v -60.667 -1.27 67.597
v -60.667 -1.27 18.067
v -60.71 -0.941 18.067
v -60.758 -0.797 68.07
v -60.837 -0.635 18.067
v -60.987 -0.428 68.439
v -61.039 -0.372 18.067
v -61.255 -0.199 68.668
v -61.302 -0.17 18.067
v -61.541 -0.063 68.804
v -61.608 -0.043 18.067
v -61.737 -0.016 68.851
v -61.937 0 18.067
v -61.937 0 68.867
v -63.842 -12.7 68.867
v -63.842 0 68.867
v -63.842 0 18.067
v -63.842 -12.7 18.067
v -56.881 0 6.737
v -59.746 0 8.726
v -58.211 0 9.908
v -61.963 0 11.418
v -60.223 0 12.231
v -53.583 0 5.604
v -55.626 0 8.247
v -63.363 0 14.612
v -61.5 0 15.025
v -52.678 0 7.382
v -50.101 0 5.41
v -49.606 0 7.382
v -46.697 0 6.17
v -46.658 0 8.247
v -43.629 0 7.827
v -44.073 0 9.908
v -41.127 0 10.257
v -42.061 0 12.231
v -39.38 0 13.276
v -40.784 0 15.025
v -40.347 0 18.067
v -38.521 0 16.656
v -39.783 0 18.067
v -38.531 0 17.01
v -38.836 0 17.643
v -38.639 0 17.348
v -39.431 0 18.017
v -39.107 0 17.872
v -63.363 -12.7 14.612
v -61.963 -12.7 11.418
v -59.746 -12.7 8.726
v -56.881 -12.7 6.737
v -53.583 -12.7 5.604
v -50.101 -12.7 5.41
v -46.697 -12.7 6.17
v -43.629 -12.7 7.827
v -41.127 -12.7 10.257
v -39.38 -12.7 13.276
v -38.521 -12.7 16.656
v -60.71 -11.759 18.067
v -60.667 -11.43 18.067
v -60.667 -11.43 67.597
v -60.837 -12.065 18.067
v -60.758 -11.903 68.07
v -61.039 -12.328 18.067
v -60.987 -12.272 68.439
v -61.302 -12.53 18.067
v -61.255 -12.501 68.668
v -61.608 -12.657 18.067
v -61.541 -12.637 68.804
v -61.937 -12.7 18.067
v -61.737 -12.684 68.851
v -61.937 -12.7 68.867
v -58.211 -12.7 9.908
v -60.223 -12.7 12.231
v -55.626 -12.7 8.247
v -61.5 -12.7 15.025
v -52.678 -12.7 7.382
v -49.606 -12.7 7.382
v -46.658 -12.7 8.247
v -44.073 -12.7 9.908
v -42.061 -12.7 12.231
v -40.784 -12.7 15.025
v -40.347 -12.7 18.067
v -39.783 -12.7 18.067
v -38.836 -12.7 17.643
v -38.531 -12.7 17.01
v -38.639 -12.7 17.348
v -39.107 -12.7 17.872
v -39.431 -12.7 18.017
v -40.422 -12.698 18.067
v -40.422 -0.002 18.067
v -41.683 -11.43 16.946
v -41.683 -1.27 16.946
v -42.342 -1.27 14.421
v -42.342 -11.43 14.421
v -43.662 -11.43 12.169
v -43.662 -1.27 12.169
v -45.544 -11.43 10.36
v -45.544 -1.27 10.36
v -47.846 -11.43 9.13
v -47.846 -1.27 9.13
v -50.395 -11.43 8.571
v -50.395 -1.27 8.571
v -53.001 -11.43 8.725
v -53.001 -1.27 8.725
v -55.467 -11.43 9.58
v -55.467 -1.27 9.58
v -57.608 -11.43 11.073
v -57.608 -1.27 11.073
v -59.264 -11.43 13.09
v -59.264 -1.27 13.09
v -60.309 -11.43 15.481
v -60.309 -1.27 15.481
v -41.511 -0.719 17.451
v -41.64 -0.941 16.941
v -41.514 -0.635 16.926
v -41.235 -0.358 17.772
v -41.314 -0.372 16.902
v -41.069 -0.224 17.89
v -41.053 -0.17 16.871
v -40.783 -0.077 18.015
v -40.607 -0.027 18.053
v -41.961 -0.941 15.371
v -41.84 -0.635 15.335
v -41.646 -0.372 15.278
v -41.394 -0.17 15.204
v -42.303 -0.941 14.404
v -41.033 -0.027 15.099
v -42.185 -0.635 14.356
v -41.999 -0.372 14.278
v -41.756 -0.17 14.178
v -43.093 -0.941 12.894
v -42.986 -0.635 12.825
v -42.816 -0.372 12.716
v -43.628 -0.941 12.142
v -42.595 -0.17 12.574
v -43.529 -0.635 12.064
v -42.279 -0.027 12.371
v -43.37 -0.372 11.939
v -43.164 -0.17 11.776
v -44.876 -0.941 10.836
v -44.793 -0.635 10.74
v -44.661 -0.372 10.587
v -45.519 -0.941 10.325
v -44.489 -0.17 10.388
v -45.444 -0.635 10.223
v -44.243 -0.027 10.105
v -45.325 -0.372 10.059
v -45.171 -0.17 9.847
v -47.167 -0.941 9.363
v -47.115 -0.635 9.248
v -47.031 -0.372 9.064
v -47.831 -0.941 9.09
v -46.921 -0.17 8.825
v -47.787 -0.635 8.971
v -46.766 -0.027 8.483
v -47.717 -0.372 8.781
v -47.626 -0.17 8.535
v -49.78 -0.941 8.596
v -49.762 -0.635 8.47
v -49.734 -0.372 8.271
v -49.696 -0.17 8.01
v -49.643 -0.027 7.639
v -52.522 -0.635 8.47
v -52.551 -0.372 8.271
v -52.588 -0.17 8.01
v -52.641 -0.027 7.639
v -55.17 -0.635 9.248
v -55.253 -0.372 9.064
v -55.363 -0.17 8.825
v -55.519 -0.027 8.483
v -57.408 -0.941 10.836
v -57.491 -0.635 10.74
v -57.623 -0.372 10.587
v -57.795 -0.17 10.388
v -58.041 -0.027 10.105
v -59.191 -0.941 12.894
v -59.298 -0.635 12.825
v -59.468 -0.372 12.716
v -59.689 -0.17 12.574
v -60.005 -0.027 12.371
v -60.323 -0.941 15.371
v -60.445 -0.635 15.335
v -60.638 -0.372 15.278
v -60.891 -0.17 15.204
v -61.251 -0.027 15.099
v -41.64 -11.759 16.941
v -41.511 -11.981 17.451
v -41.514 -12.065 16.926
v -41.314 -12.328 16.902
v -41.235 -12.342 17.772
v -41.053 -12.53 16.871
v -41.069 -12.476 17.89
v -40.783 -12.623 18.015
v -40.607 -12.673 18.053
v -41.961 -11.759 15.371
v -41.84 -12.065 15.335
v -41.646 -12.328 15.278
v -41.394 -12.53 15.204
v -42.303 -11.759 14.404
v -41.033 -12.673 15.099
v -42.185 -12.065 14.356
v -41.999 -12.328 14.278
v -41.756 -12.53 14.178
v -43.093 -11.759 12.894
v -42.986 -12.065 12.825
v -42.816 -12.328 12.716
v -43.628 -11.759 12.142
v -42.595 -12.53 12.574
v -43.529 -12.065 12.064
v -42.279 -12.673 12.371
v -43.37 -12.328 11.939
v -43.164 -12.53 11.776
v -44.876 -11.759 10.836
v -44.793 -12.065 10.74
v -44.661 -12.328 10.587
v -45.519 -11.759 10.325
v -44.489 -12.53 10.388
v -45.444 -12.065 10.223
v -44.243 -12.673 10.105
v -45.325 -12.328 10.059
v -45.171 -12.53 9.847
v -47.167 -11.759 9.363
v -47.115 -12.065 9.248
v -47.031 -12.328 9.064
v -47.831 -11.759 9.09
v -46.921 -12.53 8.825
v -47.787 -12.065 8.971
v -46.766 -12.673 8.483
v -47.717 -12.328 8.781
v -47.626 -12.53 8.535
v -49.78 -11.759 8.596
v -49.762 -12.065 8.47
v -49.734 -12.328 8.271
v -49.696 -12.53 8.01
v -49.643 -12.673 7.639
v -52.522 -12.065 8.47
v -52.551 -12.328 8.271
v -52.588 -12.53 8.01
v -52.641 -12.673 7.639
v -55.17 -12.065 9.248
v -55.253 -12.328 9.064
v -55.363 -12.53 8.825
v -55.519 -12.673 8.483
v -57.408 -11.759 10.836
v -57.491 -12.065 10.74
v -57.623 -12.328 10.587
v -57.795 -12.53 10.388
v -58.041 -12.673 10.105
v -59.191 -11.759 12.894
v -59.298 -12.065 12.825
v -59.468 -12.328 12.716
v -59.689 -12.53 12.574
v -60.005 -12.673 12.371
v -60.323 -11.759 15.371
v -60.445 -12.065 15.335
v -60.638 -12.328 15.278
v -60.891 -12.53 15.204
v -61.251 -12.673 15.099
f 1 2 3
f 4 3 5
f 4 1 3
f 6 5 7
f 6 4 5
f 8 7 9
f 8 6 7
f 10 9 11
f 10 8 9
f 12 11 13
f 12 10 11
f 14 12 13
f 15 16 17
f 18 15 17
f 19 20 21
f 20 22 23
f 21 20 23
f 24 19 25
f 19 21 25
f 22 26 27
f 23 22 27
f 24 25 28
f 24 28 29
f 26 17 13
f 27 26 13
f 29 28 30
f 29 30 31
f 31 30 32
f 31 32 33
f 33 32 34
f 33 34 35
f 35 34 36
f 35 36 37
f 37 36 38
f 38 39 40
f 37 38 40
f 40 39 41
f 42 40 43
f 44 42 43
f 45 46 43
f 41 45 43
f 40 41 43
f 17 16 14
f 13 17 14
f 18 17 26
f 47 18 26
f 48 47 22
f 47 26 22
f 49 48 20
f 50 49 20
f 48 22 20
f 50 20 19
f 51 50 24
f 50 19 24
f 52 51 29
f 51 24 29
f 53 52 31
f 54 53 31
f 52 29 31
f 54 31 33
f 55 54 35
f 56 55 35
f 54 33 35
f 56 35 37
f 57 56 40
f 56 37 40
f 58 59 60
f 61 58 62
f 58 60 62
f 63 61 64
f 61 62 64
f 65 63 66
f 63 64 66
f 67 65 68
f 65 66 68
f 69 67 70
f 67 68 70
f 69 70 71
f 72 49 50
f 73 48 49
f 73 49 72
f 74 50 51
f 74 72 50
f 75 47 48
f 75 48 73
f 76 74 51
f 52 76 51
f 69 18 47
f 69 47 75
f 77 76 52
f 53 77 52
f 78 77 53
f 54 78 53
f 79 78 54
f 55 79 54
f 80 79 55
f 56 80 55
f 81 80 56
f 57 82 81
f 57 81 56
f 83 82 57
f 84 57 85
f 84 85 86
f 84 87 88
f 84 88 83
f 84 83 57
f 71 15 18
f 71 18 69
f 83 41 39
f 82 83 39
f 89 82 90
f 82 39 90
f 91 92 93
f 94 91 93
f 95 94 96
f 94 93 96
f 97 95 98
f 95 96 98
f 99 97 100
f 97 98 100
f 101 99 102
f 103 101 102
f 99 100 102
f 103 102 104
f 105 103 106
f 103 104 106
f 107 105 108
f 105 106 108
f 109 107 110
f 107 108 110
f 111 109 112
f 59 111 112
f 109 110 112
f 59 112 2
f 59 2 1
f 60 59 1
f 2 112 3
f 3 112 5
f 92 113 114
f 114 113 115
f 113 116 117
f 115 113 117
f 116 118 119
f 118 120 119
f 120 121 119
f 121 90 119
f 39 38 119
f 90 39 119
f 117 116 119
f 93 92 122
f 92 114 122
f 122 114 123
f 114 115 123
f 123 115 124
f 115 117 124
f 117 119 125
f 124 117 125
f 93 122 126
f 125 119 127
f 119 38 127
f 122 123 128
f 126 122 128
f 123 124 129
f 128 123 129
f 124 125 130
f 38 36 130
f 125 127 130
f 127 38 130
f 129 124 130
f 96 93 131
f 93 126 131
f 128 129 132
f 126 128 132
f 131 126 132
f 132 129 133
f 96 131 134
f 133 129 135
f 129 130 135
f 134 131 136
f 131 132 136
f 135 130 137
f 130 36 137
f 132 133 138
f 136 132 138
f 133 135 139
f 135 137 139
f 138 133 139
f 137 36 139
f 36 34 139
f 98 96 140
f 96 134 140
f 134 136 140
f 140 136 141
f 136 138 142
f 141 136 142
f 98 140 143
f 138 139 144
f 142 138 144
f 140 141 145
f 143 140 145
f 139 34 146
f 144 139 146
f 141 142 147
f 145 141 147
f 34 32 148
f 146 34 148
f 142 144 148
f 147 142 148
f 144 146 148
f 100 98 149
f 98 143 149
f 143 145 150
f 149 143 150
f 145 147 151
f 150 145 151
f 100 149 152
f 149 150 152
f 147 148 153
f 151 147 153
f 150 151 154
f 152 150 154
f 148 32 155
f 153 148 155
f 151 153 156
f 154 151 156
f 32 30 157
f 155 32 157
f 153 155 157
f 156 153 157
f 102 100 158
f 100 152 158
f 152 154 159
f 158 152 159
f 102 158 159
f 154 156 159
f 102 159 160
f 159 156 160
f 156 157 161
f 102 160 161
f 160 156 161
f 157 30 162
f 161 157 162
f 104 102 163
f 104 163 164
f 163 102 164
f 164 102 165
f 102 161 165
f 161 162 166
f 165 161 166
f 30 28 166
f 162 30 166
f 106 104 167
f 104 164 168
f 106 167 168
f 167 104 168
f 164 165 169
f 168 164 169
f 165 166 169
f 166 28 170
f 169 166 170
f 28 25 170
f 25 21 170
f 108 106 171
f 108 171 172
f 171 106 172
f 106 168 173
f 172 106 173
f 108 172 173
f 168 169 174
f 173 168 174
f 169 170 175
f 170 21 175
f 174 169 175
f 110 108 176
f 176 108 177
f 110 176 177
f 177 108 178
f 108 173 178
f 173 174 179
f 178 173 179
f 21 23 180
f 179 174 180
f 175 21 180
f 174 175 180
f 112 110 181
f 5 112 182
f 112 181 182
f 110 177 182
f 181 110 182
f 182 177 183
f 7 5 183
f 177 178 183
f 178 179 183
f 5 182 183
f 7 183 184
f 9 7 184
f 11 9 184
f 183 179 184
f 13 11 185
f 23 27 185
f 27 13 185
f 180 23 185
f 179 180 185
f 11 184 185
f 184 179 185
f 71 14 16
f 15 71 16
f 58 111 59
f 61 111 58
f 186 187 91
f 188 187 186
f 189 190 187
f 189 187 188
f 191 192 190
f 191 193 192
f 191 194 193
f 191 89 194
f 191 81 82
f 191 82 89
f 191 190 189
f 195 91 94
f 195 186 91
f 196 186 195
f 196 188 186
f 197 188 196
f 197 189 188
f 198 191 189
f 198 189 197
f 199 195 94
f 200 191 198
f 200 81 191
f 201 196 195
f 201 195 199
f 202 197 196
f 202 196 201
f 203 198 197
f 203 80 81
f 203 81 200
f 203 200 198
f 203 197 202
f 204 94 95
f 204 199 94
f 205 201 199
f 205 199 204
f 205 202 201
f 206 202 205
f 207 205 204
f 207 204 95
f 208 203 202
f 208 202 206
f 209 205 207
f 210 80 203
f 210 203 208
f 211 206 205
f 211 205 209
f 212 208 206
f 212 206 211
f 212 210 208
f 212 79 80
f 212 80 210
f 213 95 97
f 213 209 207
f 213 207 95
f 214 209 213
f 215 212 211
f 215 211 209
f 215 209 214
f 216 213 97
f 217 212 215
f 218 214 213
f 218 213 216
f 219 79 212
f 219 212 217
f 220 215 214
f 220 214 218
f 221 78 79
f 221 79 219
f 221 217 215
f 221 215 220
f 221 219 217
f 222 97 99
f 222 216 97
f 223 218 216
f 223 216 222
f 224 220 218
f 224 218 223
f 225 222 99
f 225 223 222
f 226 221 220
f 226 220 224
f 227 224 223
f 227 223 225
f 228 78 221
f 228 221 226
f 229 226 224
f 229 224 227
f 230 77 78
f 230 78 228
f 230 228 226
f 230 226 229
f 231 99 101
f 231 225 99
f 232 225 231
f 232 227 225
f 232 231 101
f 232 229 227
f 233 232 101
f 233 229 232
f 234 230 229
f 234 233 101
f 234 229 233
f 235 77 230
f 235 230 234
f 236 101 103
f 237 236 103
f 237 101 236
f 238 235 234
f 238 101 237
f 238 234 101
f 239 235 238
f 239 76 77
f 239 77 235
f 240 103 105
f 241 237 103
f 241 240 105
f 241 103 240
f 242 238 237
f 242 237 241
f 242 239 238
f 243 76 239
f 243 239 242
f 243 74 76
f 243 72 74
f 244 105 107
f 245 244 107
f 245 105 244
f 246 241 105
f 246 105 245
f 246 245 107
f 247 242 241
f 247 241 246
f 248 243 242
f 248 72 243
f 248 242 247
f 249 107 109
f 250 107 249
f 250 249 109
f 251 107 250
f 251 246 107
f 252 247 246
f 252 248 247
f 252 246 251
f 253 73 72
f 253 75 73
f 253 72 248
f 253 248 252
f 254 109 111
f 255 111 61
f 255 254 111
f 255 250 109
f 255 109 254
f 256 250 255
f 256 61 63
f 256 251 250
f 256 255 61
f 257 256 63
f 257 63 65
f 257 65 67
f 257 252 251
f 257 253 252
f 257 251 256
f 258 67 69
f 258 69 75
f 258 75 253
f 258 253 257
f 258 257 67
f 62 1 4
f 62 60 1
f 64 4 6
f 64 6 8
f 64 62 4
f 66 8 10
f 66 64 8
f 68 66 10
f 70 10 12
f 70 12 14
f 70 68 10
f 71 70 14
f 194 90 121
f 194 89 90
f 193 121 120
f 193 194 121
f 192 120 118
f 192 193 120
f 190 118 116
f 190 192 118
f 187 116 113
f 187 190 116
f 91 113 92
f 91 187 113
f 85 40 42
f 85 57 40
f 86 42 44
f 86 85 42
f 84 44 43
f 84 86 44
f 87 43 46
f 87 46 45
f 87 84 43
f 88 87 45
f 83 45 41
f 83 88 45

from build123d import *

# Parameters (mm, degrees)
F1_DEPTH = 12.7
F2_R     = 1.27


with BuildPart() as f1:
    # F0 (on Front) → F1 (new body)
    with BuildSketch(Plane.XZ):
        with BuildLine():
            Line((-60.66708, 18.066773), (-60.66708, 68.866773))
            Line((-60.66708, 68.866773), (-63.84208, 68.866773))
            Line((-63.84208, 68.866773), (-63.84208, 18.066773))
            ThreePointArc((-63.84208, 18.066773), (-51.14208, 5.366773), (-38.44208, 18.066773))
            Line((-38.44208, 18.066773), (-41.61708, 18.066773))
            ThreePointArc((-41.61708, 18.066773), (-51.14208, 8.541773), (-60.66708, 18.066773))
        make_face()
    extrude(amount=F1_DEPTH)

    # F2
    f2_edges = [f1.edges().sort_by_distance(p)[0] for p in [
        (-60.66708, -12.7, 43.466773),
        (-60.66708, 0, 43.466773),
        (-38.44208, -6.35, 18.066773),
        (-41.61708, -6.35, 18.066773),
        (-60.66708, -6.35, 68.866773),
    ]]
    fillet(f2_edges, radius=F2_R)


solid = f1.part
